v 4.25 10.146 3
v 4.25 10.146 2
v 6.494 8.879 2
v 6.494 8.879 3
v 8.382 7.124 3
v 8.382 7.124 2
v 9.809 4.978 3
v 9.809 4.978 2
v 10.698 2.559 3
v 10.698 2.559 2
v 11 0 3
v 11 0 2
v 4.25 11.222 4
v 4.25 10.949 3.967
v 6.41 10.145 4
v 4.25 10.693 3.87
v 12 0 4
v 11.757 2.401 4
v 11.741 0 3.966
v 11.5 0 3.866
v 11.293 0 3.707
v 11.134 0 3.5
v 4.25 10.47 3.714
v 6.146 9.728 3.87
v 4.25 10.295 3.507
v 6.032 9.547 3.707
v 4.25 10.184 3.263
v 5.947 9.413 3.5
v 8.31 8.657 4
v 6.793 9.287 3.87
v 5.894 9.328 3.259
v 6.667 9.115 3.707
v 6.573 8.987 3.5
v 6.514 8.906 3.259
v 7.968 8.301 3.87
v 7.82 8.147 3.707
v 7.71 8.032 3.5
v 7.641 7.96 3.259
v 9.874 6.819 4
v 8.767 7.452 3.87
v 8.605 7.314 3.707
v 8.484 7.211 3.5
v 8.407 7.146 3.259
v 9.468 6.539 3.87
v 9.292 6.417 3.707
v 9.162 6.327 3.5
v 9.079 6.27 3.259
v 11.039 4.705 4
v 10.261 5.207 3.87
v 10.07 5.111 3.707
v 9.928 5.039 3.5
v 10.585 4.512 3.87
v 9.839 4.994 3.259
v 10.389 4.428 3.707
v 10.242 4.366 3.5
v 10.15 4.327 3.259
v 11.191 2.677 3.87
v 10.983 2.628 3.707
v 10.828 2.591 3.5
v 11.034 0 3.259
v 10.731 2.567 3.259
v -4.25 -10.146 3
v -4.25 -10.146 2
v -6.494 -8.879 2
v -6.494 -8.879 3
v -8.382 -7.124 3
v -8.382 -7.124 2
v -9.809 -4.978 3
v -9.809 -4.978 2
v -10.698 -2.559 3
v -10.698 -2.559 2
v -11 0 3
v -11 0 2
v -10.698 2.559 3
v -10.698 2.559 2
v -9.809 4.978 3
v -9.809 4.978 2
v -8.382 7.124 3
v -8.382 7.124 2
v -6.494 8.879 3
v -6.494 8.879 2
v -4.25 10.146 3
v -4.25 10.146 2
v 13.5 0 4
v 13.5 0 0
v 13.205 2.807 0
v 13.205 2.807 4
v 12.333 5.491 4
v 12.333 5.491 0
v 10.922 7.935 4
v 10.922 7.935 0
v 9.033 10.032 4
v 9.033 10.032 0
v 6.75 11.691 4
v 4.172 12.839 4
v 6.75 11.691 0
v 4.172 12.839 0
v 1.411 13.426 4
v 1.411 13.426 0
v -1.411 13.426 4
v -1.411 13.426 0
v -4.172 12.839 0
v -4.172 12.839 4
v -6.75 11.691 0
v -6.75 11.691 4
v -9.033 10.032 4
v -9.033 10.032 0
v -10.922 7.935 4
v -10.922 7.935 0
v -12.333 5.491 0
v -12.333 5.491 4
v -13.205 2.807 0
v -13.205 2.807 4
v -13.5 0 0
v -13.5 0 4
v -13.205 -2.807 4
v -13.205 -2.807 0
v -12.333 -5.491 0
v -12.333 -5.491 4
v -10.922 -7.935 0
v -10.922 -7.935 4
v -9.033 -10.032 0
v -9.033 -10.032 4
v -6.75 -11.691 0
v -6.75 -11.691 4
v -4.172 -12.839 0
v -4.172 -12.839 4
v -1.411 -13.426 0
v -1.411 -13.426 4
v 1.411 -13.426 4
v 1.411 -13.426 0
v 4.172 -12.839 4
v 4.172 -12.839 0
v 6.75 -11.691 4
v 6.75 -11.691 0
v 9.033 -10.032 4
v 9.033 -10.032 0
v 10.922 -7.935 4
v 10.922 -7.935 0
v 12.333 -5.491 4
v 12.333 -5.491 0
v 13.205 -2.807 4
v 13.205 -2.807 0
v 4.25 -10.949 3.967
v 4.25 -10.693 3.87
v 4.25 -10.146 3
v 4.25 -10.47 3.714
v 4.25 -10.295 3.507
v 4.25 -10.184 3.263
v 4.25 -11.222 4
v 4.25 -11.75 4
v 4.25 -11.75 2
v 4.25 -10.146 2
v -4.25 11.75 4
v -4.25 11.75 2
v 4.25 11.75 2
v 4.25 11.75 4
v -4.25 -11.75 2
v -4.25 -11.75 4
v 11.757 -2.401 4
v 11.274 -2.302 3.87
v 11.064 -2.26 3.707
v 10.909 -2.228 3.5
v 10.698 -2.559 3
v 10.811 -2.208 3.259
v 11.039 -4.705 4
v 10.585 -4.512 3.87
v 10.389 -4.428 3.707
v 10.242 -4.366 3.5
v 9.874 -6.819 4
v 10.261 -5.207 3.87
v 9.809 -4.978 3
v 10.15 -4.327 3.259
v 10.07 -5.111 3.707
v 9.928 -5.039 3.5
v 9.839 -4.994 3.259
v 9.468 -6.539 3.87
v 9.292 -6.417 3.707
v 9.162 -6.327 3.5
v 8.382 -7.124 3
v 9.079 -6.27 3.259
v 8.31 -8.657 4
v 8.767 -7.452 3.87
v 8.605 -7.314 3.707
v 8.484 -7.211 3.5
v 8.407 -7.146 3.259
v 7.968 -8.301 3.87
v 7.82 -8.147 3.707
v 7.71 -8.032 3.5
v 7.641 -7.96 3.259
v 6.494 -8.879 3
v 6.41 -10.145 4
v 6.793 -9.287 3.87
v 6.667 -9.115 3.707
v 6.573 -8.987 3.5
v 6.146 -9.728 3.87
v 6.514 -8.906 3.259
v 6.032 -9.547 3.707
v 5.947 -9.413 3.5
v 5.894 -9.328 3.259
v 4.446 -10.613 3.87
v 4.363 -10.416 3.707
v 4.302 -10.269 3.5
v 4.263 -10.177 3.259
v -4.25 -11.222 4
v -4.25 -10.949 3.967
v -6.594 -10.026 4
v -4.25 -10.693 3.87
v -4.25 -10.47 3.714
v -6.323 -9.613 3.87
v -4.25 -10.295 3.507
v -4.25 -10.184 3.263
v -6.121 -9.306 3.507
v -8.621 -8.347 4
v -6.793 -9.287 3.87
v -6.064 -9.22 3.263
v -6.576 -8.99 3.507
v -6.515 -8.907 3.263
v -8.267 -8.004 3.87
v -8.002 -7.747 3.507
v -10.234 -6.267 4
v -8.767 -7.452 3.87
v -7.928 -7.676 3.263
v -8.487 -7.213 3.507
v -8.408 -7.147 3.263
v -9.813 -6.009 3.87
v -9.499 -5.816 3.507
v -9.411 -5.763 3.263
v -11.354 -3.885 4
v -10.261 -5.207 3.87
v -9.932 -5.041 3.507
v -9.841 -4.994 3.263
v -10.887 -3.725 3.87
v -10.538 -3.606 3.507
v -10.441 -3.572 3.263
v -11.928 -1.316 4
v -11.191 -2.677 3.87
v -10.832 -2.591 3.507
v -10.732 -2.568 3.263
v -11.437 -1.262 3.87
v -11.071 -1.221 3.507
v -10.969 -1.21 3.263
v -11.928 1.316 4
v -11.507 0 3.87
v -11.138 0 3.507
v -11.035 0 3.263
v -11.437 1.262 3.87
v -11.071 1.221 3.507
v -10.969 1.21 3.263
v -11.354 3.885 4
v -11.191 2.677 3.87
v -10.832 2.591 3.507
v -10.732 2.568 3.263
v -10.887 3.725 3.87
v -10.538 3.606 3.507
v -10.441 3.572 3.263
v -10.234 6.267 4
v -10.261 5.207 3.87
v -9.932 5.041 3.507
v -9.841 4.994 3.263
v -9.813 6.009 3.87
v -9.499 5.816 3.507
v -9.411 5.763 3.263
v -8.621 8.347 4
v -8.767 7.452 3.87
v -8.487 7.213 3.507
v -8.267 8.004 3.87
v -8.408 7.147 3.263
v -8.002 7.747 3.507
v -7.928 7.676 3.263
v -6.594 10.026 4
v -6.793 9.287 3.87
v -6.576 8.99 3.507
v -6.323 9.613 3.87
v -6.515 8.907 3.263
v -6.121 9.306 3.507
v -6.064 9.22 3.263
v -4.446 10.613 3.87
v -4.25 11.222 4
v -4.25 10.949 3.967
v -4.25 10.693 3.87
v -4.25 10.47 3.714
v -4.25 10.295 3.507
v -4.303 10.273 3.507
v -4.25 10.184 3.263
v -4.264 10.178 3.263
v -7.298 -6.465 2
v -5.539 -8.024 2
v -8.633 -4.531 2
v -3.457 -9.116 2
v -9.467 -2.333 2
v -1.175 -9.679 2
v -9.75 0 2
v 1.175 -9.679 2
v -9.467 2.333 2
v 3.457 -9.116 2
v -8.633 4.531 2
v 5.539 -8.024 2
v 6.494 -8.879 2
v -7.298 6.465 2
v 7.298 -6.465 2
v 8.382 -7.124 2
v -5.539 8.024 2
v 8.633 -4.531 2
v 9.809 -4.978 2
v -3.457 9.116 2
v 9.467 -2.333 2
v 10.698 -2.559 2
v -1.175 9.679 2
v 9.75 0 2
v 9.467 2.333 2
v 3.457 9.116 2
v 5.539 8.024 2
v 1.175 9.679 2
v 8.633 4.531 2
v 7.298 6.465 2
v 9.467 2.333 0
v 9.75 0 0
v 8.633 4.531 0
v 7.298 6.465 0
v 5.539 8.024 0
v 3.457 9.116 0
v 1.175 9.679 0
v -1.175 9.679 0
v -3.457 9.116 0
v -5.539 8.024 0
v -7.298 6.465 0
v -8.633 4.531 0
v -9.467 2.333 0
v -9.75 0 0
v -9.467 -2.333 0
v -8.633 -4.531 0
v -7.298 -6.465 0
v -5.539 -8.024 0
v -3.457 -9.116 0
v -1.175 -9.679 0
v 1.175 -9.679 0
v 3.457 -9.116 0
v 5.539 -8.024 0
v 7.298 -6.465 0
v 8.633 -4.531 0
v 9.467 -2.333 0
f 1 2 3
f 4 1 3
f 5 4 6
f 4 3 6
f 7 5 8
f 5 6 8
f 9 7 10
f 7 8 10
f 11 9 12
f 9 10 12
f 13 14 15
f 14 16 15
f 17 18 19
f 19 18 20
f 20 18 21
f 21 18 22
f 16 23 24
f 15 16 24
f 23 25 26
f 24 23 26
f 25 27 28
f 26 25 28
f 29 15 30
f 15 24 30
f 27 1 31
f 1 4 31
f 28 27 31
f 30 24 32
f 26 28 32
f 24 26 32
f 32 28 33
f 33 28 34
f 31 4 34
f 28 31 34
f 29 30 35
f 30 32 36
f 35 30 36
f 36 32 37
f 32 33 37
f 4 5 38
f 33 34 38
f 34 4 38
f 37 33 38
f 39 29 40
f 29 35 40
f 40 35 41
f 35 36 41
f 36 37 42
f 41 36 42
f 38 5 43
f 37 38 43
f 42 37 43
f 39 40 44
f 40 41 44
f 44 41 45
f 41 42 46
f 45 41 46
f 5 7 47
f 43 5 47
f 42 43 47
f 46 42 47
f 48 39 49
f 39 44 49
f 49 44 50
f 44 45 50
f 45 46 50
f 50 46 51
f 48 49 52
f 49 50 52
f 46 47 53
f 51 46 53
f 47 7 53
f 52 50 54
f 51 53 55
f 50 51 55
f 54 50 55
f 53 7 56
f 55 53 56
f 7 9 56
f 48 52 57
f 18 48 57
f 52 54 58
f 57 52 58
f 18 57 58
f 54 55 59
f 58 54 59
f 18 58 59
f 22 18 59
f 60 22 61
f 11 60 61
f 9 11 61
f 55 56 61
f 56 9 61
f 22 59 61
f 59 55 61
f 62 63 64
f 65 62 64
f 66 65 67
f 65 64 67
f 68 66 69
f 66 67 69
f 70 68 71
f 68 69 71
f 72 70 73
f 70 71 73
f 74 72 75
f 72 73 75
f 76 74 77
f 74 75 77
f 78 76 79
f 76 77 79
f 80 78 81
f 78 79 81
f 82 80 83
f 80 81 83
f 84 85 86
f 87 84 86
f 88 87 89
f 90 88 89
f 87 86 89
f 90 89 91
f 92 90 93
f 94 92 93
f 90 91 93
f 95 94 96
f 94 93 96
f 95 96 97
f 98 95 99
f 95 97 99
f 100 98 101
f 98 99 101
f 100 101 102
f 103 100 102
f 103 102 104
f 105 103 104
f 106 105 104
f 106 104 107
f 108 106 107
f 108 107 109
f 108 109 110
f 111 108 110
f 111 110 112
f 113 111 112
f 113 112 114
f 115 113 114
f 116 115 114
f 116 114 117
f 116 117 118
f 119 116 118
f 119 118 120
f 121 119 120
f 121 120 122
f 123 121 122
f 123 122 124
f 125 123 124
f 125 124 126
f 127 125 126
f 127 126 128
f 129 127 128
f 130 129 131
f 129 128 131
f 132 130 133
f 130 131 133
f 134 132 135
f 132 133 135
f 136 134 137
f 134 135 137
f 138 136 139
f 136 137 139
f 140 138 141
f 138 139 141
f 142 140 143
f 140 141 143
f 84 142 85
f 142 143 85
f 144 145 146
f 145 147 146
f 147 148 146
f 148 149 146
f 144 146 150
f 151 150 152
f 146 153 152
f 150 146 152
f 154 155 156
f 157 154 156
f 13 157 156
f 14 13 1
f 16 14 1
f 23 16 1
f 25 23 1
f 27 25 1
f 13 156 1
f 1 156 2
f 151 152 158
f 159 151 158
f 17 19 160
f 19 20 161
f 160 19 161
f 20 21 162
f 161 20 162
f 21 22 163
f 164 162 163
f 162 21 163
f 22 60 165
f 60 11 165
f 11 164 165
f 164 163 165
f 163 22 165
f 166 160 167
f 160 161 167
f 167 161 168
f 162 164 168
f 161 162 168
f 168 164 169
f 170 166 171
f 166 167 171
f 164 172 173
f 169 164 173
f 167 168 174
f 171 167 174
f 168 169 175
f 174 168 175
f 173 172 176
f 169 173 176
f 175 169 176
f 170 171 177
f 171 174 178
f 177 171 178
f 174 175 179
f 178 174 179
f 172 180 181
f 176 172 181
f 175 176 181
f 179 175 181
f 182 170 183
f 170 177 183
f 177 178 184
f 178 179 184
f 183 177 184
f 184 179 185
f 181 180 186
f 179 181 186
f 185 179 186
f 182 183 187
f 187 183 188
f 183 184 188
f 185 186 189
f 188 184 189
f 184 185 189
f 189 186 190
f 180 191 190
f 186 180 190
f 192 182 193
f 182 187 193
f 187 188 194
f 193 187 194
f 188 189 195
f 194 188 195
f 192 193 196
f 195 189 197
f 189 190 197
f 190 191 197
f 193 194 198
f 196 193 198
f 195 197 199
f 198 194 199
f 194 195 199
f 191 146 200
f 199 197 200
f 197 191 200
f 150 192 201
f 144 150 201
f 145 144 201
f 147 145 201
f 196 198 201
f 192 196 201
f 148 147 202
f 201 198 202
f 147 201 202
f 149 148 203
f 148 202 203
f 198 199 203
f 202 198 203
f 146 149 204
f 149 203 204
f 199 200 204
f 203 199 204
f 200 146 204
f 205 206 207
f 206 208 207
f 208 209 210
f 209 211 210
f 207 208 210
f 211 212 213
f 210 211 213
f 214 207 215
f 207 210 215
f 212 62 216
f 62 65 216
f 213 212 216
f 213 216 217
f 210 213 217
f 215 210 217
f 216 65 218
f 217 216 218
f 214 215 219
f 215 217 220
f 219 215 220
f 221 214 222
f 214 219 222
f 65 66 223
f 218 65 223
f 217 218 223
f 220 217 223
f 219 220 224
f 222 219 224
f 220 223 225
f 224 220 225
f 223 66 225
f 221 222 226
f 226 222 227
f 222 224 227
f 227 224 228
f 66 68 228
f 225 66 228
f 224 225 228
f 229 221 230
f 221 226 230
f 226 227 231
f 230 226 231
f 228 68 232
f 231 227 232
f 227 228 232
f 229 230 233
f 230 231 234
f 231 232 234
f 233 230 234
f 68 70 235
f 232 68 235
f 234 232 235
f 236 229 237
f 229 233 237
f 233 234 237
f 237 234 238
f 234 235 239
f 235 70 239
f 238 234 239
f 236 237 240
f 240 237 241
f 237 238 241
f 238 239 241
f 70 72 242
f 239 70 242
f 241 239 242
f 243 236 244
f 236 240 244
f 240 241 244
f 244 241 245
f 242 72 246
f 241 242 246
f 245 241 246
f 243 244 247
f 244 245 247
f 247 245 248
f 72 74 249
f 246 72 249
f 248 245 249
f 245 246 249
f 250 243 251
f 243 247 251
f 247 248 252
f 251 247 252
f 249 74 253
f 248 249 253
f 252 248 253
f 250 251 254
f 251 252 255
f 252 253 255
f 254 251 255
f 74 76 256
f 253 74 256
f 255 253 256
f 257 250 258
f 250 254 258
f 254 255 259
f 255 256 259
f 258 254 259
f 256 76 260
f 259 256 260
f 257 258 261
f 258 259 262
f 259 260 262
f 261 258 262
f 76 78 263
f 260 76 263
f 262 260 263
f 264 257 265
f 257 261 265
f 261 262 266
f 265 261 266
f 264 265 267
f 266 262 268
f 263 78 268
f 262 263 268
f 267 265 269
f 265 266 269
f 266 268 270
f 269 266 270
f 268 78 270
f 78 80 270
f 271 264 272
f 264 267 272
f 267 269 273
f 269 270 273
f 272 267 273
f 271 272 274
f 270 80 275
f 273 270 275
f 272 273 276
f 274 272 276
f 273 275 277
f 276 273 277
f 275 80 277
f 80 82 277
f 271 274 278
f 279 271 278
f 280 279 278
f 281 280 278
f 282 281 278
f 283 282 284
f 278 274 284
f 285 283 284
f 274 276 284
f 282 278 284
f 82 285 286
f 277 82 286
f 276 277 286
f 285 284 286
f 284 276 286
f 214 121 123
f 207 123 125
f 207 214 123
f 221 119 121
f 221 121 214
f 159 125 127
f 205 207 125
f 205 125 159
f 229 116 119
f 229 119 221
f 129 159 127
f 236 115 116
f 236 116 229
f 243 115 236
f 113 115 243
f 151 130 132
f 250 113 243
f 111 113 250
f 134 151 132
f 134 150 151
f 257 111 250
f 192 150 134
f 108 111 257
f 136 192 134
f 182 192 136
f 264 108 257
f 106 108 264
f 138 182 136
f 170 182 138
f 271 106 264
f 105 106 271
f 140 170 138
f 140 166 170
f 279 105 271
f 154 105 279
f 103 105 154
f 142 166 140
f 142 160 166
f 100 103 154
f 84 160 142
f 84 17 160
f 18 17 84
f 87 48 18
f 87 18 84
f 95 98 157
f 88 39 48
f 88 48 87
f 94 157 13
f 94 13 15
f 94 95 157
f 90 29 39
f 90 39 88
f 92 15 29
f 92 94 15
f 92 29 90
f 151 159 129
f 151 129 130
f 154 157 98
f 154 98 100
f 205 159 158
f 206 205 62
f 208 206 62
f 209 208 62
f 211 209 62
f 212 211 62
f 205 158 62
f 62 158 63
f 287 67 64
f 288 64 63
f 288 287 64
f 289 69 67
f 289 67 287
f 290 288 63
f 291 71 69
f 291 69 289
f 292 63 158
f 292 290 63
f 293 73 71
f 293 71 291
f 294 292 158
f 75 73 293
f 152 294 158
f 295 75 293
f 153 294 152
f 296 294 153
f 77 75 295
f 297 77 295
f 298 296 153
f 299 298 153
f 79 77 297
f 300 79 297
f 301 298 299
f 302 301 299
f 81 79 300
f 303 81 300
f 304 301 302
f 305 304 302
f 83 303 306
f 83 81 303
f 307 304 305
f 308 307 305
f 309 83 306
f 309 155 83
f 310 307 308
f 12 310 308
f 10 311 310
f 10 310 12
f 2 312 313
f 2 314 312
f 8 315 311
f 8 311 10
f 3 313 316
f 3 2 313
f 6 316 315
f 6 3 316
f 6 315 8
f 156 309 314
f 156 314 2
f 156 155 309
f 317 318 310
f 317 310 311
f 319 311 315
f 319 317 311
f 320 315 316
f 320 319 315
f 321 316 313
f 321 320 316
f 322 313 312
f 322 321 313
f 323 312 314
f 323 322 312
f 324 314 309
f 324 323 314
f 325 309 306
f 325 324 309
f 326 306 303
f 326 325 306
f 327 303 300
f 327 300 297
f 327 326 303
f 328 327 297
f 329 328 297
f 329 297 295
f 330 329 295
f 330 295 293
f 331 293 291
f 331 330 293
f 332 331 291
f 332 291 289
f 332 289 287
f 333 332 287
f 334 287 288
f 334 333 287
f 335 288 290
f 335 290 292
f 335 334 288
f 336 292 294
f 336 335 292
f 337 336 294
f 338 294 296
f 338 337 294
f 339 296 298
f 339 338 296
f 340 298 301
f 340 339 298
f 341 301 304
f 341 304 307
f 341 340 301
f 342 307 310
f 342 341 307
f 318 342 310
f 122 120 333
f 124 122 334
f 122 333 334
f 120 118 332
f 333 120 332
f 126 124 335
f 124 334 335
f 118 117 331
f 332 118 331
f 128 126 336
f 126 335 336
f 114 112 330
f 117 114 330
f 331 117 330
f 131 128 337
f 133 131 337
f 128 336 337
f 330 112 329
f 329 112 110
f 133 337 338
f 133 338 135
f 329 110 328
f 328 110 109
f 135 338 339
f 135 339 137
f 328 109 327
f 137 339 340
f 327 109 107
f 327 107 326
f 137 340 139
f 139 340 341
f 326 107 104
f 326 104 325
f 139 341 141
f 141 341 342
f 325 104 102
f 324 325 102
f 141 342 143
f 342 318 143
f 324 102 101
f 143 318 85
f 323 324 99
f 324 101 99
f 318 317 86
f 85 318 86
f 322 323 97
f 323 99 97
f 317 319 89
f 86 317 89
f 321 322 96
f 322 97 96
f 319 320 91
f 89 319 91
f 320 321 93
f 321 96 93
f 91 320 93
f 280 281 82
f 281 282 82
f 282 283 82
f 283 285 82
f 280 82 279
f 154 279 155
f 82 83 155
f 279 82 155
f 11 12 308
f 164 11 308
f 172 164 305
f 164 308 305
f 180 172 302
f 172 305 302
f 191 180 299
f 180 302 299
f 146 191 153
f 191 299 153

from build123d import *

# Parameters (mm, degrees)
F0_R     = 13.5
F1_DEPTH = 4
F2_R     = 13.5
F2_R_2   = 9.75
F3_DEPTH = 2
F4_R     = 1


with BuildPart() as f1:
    # F0 (on Top) → F1 (new body)
    with BuildSketch(Plane.XY):
        Circle(F0_R)
        with BuildLine():
            ThreePointArc((4.25, 10.1458119439), (9.158329542, 6.0930288035), (11, 0))
            ThreePointArc((11, 0), (9.158329542, -6.0930288035), (4.25, -10.1458119439))
            Line((4.25, -10.1458119439), (4.25, -11.75))
            Line((4.25, -11.75), (-4.25, -11.75))
            Line((-4.25, -11.75), (-4.25, -10.1458119439))
            ThreePointArc((-4.25, -10.1458119439), (-11, 0), (-4.25, 10.1458119439))
            Line((-4.25, 10.1458119439), (-4.25, 11.75))
            Line((-4.25, 11.75), (4.25, 11.75))
            Line((4.25, 11.75), (4.25, 10.1458119439))
        make_face(mode=Mode.SUBTRACT)
    extrude(amount=F1_DEPTH)

    # F2 (on Top) → F3 (join)
    with BuildSketch(Plane.XY):
        Circle(F2_R)
        Circle(F2_R_2, mode=Mode.SUBTRACT)
    extrude(amount=F3_DEPTH)

    # F4
    f4_edges = [f1.edges().sort_by_distance(p)[0] for p in [
        (11, 0, 4),
        (-11, 0, 4),
    ]]
    fillet(f4_edges, radius=F4_R)


solid = f1.part
